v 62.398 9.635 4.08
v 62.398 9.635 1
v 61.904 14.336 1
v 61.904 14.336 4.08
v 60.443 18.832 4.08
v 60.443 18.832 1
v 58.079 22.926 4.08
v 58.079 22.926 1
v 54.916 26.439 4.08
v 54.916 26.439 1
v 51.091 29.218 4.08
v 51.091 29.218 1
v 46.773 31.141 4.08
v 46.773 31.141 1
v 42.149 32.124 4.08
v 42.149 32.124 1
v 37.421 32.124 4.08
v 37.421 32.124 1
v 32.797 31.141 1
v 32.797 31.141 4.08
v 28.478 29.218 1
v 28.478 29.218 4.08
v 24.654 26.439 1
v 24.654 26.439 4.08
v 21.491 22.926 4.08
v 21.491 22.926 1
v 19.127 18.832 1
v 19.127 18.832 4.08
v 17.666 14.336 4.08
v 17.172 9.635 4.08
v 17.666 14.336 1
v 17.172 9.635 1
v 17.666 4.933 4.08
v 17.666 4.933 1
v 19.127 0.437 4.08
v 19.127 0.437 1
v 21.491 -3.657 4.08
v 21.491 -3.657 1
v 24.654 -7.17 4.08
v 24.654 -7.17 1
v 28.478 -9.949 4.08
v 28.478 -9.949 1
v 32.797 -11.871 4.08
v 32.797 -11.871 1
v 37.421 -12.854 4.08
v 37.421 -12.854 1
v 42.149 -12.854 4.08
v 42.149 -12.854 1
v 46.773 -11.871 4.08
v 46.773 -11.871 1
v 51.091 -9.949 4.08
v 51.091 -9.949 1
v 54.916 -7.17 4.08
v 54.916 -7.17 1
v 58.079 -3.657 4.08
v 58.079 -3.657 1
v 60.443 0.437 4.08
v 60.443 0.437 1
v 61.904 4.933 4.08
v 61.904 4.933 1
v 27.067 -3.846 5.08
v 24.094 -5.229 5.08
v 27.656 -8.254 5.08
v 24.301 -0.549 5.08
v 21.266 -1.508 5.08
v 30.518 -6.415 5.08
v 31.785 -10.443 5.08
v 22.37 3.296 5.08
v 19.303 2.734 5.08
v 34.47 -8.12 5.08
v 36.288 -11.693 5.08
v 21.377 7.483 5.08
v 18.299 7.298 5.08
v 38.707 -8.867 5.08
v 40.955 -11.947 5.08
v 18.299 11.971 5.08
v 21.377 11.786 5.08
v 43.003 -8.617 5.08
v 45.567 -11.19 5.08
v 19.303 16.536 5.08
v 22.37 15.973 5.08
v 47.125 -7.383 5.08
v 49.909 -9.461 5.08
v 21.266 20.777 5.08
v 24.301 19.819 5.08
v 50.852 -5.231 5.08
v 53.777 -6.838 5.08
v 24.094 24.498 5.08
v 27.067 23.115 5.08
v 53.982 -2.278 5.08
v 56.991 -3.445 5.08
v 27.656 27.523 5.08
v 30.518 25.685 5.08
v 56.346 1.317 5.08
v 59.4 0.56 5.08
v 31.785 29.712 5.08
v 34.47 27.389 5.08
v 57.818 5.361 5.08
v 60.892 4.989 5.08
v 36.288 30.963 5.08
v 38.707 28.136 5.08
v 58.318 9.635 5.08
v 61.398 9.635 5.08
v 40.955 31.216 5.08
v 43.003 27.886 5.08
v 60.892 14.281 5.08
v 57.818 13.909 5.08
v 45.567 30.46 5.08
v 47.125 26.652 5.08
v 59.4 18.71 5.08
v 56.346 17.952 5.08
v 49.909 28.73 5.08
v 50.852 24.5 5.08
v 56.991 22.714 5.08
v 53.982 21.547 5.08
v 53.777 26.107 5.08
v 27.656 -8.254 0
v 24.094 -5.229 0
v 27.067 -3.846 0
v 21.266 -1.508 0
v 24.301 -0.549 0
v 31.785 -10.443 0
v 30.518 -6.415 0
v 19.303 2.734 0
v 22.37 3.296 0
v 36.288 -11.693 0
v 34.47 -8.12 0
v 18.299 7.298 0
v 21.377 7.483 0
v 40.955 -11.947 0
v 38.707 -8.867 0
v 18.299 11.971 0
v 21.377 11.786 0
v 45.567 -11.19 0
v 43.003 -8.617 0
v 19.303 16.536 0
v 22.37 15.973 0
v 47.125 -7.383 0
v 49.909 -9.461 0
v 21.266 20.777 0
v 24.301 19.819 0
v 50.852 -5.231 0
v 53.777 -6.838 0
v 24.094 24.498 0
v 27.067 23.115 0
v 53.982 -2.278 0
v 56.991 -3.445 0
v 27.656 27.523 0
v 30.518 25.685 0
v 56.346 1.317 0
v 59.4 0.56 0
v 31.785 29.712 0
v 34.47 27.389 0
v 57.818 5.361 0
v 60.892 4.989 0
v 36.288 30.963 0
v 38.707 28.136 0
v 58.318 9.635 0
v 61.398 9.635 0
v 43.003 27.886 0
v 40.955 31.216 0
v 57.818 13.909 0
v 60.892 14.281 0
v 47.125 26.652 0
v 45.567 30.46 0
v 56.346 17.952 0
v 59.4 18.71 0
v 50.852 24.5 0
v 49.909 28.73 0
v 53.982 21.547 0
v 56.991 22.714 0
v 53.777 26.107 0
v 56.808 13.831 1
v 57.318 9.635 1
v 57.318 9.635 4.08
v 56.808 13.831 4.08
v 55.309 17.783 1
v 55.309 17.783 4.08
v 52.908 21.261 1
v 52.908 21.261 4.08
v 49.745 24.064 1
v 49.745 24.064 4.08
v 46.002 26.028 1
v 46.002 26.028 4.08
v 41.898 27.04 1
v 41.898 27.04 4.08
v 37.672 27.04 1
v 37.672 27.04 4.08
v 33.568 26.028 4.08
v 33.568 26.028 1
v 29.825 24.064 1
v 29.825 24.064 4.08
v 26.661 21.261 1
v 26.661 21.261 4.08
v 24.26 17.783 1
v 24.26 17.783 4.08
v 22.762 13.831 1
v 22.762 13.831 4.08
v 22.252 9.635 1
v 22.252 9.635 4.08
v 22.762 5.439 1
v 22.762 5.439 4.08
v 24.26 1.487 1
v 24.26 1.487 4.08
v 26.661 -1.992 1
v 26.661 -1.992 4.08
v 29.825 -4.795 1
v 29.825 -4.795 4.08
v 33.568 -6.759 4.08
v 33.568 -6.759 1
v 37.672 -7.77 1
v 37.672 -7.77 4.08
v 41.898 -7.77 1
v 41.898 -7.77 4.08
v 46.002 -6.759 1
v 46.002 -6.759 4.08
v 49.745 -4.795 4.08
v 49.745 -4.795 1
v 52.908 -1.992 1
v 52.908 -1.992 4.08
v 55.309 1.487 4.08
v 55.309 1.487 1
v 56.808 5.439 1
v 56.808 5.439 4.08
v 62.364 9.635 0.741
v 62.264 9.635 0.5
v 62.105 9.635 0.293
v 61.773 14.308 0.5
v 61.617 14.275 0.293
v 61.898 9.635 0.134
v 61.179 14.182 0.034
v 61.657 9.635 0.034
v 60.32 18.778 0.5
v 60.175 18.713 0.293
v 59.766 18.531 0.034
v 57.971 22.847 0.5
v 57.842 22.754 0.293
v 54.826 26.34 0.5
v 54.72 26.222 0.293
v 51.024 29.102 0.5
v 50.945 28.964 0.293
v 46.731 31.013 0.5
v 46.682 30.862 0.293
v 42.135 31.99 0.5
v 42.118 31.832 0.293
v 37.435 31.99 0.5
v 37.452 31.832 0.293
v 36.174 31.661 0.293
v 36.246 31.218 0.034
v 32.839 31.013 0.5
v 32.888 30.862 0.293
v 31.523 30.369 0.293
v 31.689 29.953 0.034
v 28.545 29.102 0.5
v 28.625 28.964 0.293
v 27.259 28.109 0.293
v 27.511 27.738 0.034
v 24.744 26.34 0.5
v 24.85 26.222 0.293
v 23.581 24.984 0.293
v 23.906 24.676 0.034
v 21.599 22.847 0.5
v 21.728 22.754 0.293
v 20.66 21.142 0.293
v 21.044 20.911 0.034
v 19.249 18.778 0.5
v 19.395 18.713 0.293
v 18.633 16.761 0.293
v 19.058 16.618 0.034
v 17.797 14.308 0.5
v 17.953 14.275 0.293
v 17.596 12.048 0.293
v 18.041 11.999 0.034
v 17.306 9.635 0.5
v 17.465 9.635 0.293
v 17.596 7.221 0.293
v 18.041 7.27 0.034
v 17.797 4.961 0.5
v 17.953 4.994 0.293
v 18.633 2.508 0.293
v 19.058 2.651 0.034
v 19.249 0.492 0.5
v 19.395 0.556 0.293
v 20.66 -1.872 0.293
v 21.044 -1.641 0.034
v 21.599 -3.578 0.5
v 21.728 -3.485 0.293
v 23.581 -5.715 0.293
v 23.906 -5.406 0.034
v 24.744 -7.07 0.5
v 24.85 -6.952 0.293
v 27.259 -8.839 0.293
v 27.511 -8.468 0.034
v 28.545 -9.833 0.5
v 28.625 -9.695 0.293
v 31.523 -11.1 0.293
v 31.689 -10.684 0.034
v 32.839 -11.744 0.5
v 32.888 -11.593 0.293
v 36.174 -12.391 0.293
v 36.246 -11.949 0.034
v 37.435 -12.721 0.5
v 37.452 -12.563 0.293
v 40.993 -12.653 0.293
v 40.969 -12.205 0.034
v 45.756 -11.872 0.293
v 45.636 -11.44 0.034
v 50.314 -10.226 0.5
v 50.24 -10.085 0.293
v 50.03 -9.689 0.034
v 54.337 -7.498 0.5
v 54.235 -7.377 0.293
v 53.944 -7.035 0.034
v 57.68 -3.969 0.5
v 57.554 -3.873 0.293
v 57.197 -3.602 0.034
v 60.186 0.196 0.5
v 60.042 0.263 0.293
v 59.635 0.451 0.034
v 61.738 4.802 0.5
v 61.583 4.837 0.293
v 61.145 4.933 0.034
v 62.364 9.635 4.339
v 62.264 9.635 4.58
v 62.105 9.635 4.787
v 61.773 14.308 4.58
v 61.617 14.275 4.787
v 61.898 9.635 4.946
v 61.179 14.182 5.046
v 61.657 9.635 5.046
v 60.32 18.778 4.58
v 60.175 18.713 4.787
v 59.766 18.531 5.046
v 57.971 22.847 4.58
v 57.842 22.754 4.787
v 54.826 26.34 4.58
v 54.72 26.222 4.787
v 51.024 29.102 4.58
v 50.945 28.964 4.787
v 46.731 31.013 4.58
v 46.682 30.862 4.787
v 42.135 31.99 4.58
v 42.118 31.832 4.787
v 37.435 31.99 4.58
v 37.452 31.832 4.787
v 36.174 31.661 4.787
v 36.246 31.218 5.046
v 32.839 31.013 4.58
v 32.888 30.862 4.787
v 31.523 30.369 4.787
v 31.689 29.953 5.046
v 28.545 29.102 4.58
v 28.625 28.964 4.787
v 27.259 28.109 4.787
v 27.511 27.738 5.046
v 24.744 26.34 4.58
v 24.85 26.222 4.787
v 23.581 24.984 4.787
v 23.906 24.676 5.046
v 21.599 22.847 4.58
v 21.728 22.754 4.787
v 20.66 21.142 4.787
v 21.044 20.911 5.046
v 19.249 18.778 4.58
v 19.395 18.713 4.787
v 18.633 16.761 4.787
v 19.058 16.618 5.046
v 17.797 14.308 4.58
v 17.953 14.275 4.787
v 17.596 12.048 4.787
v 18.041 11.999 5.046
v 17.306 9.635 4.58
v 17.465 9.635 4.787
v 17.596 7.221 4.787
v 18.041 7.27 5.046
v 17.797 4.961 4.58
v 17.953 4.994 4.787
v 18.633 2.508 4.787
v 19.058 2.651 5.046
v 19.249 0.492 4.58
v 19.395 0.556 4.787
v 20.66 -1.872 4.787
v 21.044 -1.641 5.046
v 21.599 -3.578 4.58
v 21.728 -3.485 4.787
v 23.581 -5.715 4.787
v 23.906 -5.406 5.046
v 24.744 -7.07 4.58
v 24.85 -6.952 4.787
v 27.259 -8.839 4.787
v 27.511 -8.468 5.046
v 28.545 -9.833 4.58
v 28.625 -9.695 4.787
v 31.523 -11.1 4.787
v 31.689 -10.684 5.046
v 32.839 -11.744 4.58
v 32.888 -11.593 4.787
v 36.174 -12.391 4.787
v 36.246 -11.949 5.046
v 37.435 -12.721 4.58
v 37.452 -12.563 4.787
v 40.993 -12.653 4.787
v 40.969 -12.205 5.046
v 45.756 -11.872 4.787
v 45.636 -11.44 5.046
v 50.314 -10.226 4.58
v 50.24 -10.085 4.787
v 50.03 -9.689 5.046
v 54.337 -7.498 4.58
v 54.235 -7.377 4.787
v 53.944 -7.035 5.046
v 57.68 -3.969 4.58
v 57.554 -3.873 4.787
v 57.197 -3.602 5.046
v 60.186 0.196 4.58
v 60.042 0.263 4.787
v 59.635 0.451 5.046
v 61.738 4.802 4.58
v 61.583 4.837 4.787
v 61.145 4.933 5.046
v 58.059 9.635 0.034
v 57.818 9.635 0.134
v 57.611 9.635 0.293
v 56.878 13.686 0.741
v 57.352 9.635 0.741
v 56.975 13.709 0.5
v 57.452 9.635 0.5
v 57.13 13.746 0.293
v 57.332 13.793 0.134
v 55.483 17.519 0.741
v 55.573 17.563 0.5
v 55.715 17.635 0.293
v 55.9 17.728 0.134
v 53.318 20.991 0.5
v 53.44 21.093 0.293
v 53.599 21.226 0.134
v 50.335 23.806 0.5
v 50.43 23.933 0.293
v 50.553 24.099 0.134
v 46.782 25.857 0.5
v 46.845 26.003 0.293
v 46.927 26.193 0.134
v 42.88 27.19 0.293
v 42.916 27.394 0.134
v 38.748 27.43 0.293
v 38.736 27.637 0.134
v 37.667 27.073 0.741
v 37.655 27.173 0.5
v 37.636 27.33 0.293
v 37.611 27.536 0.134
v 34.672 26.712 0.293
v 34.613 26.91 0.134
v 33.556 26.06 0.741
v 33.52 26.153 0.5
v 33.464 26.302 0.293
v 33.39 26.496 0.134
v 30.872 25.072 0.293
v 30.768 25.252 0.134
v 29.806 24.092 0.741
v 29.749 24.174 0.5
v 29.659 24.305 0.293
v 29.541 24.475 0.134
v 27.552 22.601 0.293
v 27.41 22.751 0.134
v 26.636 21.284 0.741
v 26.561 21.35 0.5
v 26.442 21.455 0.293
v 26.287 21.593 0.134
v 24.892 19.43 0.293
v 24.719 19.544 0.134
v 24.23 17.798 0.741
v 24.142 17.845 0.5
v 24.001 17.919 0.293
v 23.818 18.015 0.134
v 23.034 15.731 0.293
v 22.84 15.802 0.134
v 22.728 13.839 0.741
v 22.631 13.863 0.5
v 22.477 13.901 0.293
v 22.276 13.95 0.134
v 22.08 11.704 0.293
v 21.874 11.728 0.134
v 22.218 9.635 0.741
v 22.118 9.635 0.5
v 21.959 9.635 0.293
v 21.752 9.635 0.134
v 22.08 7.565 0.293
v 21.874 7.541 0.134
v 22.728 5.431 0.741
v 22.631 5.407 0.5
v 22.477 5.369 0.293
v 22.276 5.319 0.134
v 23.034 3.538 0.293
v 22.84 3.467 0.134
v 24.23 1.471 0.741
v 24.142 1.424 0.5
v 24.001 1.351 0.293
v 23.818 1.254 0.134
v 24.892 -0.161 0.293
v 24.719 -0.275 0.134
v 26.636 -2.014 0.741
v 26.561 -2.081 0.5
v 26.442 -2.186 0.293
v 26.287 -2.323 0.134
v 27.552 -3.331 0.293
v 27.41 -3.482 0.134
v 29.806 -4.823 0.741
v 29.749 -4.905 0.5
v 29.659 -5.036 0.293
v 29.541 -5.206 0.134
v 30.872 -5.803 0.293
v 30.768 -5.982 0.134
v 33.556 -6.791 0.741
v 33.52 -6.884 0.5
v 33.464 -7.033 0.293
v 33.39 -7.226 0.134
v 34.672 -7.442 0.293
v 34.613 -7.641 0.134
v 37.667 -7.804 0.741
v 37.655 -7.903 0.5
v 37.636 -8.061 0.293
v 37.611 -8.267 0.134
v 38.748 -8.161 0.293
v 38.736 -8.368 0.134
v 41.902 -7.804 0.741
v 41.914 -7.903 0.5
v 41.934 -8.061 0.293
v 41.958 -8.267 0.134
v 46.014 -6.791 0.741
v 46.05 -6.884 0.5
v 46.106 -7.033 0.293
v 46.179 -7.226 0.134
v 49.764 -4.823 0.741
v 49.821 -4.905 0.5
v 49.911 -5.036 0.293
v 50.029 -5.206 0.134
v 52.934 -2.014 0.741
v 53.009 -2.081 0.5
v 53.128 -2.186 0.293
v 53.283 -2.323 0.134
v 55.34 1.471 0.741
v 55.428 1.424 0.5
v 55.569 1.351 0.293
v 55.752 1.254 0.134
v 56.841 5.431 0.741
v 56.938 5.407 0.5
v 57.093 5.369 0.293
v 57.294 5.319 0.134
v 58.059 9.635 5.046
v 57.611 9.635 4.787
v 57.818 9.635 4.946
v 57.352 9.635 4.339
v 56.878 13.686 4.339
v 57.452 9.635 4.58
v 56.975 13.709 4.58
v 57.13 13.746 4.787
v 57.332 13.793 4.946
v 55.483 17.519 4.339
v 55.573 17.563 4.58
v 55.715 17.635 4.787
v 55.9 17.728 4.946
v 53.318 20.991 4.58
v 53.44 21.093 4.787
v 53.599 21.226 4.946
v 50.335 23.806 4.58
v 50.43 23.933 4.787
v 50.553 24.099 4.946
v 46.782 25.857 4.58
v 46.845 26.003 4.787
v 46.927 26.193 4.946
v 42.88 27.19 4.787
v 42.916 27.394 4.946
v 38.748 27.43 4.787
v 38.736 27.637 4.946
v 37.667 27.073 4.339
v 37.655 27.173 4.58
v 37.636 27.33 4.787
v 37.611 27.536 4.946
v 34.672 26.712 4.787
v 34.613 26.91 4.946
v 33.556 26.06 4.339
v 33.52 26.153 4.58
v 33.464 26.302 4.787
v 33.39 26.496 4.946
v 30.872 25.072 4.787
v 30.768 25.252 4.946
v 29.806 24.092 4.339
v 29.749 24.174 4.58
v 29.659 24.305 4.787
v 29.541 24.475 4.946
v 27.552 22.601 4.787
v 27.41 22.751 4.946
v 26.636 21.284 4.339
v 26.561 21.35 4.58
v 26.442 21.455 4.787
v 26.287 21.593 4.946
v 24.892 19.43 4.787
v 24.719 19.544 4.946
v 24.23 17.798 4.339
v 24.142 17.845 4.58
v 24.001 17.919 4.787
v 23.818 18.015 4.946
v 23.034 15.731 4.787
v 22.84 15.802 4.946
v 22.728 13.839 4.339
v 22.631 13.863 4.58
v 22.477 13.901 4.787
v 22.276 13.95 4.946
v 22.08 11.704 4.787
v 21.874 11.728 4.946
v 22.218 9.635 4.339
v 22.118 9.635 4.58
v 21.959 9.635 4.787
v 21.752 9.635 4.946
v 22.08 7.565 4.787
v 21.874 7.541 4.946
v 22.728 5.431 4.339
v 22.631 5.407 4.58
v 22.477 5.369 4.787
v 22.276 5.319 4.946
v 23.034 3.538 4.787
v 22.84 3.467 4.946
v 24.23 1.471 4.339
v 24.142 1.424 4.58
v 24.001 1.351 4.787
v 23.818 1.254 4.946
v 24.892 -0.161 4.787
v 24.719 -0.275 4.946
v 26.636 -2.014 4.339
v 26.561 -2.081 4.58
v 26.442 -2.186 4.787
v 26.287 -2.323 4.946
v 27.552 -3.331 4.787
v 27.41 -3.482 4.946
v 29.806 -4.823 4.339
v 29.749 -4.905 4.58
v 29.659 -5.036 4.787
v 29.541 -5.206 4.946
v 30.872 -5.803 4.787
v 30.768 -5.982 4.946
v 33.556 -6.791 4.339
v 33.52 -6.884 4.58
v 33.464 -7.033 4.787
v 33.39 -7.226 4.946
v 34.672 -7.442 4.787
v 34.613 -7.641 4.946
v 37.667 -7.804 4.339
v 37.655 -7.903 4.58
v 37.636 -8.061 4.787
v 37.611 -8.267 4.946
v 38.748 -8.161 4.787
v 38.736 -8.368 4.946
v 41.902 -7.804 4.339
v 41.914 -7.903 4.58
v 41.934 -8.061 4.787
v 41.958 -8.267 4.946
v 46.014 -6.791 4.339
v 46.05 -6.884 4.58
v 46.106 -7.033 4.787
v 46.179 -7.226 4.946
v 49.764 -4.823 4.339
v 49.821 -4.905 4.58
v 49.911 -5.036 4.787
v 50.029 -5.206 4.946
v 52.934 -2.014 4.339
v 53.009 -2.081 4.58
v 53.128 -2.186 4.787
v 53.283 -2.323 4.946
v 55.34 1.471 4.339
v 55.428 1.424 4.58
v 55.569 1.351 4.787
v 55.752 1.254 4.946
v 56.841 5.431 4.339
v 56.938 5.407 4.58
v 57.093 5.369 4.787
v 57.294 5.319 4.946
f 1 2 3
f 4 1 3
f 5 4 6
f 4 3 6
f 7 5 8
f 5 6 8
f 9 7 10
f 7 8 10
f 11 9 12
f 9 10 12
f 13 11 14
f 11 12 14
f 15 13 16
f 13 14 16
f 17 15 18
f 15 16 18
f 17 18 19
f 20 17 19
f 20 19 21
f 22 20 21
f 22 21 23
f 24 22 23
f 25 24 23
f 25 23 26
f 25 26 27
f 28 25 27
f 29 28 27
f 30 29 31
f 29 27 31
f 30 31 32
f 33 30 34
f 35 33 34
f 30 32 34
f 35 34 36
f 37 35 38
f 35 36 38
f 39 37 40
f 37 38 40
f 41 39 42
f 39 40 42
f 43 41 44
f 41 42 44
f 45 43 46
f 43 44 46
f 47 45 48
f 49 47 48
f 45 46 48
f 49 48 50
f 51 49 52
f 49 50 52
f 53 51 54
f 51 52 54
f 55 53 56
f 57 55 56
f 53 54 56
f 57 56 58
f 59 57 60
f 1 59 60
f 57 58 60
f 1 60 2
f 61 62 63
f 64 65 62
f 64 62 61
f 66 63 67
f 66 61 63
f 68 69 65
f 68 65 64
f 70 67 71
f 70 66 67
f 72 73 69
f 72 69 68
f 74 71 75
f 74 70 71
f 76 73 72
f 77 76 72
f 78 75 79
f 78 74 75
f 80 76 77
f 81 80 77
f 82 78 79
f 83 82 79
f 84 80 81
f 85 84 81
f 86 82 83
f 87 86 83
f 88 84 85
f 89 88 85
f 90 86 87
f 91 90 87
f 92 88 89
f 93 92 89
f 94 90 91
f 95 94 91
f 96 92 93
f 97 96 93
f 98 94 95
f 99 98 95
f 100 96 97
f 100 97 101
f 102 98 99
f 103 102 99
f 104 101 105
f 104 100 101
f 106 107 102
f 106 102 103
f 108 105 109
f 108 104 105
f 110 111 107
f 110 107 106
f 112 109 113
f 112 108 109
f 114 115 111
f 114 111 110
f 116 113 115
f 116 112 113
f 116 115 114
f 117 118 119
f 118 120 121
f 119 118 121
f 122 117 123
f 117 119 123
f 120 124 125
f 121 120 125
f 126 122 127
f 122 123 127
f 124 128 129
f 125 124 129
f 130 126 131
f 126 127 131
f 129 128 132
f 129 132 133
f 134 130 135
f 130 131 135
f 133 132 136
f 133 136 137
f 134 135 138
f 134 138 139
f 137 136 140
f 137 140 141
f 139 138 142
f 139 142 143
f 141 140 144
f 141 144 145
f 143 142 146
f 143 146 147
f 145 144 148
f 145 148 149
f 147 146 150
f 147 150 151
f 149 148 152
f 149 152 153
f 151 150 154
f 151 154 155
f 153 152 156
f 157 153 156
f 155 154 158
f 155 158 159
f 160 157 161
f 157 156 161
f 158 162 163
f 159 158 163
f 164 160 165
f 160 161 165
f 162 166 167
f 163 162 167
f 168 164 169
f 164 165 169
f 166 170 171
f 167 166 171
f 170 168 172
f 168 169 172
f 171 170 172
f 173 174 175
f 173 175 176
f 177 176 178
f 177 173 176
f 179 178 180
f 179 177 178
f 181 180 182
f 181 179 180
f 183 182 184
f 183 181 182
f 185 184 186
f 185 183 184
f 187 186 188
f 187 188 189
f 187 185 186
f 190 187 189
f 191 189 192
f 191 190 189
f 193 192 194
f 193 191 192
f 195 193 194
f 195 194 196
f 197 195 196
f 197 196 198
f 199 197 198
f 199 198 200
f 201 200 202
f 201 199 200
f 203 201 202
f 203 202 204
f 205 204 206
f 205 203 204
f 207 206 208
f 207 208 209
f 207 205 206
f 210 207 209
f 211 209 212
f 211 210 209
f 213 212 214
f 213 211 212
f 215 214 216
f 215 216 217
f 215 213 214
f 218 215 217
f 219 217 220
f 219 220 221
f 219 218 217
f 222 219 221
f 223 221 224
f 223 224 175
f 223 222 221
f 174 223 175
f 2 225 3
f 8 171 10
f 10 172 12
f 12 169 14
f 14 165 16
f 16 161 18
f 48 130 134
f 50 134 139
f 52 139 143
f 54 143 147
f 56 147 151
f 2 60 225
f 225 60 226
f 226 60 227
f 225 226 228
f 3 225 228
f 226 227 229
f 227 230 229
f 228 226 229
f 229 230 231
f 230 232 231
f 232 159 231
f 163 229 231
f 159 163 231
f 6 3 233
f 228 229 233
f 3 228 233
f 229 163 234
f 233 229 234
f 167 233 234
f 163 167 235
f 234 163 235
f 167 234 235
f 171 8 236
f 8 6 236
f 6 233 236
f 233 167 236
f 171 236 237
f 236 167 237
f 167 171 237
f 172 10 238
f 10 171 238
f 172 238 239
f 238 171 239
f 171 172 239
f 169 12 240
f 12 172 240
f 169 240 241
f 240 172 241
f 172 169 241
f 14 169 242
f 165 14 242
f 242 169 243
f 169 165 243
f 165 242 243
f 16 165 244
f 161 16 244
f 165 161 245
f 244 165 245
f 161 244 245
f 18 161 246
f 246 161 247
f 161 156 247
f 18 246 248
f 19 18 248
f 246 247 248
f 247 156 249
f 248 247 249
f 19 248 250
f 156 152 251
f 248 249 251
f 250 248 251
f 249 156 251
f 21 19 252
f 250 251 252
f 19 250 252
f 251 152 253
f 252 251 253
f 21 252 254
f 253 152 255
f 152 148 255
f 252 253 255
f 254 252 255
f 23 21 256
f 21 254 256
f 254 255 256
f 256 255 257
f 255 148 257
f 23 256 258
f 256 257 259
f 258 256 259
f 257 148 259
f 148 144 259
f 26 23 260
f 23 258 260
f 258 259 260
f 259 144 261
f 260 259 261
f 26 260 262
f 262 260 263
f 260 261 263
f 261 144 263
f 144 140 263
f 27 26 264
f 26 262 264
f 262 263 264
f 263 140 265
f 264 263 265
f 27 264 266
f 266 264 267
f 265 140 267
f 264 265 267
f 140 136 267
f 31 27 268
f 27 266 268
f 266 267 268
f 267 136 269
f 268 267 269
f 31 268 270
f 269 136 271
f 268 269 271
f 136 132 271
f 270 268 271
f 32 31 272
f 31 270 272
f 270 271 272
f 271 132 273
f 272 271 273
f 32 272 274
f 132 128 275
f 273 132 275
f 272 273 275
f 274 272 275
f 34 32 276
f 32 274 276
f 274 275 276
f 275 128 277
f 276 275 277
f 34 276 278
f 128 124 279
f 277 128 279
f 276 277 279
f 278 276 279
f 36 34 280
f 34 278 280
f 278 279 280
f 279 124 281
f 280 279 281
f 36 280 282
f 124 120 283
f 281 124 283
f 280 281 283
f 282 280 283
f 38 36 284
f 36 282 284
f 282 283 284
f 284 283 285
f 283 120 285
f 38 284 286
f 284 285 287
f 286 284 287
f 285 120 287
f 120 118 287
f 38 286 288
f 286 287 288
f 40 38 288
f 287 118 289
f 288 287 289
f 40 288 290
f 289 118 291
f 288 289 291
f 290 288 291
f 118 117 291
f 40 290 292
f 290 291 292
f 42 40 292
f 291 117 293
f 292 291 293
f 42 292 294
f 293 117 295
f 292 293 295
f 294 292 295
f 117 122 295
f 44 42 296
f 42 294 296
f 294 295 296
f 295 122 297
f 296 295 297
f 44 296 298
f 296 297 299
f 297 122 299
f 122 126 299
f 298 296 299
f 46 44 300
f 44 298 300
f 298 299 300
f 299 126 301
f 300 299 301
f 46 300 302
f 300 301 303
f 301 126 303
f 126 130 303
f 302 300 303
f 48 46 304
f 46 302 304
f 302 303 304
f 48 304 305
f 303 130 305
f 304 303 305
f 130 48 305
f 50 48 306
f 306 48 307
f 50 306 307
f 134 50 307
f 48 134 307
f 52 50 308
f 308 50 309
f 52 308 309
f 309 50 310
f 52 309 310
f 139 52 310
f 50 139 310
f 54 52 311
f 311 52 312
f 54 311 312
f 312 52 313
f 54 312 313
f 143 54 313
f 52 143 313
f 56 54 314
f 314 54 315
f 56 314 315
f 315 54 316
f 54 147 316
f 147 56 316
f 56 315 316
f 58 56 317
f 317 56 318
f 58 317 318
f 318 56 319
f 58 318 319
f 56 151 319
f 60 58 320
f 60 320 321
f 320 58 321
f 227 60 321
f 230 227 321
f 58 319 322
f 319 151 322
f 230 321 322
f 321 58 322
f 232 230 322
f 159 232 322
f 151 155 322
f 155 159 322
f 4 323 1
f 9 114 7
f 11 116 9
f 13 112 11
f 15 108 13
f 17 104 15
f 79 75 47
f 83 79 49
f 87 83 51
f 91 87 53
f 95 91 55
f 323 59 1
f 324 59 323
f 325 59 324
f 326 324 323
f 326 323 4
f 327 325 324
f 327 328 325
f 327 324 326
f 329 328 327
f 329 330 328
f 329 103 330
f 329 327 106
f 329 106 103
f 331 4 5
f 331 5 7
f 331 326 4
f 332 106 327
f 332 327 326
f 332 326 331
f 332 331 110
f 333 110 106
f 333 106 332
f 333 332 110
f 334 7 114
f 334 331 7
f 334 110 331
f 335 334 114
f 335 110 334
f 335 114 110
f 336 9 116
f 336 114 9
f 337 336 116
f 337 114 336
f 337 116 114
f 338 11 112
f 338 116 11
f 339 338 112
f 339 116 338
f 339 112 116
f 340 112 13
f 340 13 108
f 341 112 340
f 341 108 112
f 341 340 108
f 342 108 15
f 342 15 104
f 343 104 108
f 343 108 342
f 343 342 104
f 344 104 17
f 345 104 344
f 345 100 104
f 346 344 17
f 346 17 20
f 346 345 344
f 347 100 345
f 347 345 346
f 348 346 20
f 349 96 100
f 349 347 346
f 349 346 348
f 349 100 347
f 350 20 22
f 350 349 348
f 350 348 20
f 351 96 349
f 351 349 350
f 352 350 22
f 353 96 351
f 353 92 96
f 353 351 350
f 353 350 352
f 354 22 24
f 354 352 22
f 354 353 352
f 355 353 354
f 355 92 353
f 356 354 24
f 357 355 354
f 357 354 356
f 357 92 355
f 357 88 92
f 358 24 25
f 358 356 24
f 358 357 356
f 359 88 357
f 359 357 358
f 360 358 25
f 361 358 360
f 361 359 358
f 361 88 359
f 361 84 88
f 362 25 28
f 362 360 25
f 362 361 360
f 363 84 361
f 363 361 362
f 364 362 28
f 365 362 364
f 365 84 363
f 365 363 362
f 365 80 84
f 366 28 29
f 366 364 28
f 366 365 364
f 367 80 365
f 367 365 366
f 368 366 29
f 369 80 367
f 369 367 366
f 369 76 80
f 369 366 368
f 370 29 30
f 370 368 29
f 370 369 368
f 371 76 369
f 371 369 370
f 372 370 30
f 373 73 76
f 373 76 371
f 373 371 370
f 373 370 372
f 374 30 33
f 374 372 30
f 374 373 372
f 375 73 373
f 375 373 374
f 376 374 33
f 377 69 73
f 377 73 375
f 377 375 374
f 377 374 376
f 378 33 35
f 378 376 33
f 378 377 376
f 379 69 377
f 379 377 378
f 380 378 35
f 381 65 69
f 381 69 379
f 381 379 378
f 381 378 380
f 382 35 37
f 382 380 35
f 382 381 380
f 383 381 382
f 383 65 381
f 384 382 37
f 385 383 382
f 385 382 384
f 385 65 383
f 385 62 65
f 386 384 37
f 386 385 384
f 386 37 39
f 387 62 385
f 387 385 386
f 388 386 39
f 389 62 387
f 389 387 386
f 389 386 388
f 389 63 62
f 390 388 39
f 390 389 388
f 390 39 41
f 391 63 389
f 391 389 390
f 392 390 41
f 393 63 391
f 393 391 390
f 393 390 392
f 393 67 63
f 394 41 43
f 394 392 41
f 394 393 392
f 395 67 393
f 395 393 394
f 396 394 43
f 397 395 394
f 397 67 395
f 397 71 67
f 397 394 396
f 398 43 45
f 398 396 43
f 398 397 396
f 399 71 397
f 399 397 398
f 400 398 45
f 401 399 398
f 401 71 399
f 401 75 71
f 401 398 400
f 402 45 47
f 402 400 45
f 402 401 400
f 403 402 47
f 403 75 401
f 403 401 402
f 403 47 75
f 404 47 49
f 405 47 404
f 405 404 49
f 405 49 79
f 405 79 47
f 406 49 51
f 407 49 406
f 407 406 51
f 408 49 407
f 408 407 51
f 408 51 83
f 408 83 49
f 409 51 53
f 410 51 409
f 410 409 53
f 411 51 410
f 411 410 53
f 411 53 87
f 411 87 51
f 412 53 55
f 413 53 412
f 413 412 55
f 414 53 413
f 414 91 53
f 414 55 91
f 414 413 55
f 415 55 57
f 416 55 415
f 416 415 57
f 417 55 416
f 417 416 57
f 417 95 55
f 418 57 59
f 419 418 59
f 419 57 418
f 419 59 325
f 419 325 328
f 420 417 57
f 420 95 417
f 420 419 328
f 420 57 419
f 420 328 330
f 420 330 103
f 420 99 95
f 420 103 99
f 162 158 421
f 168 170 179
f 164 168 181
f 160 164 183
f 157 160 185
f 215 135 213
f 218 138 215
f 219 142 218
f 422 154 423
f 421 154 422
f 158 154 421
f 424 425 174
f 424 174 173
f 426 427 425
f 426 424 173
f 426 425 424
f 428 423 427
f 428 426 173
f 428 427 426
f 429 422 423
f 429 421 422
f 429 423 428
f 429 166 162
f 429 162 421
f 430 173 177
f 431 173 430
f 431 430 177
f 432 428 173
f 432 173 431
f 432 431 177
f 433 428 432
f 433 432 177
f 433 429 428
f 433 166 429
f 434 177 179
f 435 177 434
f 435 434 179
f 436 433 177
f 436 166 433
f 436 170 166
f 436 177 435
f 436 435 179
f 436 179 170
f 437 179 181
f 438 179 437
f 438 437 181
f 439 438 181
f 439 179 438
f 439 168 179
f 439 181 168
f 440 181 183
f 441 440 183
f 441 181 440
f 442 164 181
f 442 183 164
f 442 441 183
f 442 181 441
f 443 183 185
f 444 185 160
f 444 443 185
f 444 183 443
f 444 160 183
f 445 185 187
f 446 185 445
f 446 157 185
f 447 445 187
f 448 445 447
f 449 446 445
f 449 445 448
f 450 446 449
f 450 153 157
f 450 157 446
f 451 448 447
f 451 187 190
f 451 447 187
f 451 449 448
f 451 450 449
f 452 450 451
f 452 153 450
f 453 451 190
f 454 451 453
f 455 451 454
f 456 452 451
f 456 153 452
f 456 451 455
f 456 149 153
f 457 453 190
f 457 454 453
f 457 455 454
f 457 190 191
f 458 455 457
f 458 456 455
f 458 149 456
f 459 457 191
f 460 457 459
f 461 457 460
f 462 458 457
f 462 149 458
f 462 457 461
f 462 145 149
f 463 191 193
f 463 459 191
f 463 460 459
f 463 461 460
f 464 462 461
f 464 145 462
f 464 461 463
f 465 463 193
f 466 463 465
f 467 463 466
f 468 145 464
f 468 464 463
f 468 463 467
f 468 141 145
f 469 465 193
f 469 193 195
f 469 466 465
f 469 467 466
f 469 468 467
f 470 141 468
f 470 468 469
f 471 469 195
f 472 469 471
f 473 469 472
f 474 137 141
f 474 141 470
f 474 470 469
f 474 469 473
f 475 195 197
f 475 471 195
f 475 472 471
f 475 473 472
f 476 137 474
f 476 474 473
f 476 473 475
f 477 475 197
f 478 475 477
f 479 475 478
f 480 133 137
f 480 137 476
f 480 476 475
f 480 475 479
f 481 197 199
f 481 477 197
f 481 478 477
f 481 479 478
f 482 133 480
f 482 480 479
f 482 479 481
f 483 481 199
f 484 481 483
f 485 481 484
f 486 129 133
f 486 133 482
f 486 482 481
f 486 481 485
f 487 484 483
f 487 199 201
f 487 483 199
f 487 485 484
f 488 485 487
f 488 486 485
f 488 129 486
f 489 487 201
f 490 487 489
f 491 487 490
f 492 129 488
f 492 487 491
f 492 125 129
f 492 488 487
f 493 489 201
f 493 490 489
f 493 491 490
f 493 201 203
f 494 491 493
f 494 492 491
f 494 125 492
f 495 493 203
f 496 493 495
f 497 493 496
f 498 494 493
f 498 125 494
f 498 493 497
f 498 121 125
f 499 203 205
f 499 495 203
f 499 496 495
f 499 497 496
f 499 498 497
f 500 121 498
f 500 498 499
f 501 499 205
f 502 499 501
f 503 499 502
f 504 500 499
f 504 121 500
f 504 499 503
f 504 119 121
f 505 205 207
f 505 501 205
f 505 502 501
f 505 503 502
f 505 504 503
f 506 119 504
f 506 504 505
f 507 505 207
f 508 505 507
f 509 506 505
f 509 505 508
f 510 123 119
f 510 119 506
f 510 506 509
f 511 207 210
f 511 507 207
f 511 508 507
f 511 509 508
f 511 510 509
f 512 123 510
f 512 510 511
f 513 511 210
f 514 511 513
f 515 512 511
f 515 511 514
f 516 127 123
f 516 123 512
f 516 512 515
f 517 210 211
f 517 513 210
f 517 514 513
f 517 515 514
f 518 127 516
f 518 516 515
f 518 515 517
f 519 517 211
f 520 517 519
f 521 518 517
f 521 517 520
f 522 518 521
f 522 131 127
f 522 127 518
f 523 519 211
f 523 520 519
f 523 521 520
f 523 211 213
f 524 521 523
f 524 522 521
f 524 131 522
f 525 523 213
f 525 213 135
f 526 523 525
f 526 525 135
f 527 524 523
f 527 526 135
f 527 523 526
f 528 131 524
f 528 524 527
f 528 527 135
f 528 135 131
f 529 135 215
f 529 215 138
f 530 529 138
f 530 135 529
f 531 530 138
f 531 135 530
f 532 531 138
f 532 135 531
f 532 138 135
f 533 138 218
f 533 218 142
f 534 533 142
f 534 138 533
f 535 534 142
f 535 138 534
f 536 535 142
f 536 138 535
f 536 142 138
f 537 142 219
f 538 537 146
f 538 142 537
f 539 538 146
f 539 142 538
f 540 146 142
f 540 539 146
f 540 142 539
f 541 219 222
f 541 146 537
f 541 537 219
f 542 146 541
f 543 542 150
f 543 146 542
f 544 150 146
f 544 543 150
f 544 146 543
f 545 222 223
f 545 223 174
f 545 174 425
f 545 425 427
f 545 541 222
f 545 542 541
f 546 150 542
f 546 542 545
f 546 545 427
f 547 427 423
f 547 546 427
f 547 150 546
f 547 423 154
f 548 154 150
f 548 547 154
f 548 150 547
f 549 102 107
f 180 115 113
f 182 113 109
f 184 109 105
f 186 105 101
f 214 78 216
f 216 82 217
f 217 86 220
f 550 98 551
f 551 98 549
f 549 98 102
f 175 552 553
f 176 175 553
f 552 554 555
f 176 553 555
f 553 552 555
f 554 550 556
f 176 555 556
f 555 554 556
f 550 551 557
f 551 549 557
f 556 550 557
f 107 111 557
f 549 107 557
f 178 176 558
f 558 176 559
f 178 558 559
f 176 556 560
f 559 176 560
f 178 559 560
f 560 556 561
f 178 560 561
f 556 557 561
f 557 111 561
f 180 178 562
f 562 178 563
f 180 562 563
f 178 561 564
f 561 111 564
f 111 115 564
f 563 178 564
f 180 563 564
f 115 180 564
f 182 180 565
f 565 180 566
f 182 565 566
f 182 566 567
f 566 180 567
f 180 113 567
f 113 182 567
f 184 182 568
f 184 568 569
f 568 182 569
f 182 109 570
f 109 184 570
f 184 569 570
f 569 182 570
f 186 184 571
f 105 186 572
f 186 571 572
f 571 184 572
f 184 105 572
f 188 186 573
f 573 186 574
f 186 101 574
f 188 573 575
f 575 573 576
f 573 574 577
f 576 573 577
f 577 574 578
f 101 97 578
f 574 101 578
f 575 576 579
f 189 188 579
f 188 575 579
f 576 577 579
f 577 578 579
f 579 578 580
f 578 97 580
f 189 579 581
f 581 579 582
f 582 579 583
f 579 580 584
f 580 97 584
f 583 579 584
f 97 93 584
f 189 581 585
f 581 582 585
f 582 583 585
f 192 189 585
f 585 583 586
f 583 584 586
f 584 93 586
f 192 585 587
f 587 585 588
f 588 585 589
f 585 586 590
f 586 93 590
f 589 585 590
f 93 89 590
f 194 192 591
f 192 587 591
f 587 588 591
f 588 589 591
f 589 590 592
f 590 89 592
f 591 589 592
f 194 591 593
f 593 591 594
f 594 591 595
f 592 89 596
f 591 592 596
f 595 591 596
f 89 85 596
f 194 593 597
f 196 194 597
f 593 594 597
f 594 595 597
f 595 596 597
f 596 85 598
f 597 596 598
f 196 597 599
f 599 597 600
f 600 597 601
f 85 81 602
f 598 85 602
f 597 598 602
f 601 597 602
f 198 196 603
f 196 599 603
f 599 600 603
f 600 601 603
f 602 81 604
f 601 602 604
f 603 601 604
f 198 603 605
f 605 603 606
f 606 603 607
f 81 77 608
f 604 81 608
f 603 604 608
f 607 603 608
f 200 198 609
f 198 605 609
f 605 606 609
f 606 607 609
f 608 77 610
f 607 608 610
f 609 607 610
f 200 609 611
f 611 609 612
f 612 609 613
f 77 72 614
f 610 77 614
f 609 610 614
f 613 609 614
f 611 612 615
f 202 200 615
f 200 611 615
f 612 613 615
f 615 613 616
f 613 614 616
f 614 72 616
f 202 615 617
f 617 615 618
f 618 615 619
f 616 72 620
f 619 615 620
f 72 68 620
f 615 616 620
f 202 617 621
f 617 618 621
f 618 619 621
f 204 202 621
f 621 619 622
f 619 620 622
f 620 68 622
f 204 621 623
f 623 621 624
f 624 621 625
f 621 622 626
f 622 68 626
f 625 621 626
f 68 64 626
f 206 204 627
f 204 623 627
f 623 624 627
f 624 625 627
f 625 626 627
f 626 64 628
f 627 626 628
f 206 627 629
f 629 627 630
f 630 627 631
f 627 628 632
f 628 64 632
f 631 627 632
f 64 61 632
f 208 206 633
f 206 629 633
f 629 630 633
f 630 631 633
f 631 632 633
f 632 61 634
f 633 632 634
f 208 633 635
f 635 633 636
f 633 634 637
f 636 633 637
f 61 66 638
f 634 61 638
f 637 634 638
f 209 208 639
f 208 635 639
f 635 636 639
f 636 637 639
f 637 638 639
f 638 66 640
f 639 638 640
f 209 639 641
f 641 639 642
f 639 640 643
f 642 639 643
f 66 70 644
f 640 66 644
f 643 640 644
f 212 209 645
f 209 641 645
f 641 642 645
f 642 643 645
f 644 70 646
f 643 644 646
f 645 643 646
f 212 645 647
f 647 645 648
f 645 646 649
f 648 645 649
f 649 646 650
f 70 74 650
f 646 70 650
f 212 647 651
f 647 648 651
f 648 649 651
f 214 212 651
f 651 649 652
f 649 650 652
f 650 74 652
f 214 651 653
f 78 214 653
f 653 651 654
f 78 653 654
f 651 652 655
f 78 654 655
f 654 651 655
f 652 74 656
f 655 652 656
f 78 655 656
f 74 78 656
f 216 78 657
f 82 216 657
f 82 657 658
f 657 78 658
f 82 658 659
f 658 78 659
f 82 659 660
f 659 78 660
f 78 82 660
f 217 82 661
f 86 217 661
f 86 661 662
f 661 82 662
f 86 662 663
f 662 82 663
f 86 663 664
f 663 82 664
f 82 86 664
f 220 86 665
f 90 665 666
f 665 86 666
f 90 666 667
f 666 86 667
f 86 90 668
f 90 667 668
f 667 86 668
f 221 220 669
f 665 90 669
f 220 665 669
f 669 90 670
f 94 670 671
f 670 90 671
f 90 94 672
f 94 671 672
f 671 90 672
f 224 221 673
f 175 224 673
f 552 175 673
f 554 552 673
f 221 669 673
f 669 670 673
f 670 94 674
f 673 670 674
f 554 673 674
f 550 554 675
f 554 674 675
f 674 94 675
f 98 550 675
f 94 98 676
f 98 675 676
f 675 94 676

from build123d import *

# Parameters (mm, degrees)
SKETCH1_R           = 22.612840435
SKETCH1_R_2         = 17.532840435
EXTRUDE_THIN1_DEPTH = 5.08
FILLET1_R           = 1


with BuildPart() as part:
    # Sketch1 → Extrude-Thin1 (new body)
    with BuildSketch(Plane.XY):
        with Locations((39.784875199, 9.634635023)):
            Circle(SKETCH1_R)
        with Locations((39.784875199, 9.634635023)):
            Circle(SKETCH1_R_2, mode=Mode.SUBTRACT)
    extrude(amount=EXTRUDE_THIN1_DEPTH)

    # Fillet1
    fillet1_edges = [part.edges().sort_by_distance(p)[0] for p in [
        (17.172034764, 9.634635023, 0),
        (17.172034764, 9.634635023, 5.08),
        (22.252034764, 9.634635023, 0),
        (22.252034764, 9.634635023, 5.08),
    ]]
    fillet(fillet1_edges, radius=FILLET1_R)


solid = part.part
